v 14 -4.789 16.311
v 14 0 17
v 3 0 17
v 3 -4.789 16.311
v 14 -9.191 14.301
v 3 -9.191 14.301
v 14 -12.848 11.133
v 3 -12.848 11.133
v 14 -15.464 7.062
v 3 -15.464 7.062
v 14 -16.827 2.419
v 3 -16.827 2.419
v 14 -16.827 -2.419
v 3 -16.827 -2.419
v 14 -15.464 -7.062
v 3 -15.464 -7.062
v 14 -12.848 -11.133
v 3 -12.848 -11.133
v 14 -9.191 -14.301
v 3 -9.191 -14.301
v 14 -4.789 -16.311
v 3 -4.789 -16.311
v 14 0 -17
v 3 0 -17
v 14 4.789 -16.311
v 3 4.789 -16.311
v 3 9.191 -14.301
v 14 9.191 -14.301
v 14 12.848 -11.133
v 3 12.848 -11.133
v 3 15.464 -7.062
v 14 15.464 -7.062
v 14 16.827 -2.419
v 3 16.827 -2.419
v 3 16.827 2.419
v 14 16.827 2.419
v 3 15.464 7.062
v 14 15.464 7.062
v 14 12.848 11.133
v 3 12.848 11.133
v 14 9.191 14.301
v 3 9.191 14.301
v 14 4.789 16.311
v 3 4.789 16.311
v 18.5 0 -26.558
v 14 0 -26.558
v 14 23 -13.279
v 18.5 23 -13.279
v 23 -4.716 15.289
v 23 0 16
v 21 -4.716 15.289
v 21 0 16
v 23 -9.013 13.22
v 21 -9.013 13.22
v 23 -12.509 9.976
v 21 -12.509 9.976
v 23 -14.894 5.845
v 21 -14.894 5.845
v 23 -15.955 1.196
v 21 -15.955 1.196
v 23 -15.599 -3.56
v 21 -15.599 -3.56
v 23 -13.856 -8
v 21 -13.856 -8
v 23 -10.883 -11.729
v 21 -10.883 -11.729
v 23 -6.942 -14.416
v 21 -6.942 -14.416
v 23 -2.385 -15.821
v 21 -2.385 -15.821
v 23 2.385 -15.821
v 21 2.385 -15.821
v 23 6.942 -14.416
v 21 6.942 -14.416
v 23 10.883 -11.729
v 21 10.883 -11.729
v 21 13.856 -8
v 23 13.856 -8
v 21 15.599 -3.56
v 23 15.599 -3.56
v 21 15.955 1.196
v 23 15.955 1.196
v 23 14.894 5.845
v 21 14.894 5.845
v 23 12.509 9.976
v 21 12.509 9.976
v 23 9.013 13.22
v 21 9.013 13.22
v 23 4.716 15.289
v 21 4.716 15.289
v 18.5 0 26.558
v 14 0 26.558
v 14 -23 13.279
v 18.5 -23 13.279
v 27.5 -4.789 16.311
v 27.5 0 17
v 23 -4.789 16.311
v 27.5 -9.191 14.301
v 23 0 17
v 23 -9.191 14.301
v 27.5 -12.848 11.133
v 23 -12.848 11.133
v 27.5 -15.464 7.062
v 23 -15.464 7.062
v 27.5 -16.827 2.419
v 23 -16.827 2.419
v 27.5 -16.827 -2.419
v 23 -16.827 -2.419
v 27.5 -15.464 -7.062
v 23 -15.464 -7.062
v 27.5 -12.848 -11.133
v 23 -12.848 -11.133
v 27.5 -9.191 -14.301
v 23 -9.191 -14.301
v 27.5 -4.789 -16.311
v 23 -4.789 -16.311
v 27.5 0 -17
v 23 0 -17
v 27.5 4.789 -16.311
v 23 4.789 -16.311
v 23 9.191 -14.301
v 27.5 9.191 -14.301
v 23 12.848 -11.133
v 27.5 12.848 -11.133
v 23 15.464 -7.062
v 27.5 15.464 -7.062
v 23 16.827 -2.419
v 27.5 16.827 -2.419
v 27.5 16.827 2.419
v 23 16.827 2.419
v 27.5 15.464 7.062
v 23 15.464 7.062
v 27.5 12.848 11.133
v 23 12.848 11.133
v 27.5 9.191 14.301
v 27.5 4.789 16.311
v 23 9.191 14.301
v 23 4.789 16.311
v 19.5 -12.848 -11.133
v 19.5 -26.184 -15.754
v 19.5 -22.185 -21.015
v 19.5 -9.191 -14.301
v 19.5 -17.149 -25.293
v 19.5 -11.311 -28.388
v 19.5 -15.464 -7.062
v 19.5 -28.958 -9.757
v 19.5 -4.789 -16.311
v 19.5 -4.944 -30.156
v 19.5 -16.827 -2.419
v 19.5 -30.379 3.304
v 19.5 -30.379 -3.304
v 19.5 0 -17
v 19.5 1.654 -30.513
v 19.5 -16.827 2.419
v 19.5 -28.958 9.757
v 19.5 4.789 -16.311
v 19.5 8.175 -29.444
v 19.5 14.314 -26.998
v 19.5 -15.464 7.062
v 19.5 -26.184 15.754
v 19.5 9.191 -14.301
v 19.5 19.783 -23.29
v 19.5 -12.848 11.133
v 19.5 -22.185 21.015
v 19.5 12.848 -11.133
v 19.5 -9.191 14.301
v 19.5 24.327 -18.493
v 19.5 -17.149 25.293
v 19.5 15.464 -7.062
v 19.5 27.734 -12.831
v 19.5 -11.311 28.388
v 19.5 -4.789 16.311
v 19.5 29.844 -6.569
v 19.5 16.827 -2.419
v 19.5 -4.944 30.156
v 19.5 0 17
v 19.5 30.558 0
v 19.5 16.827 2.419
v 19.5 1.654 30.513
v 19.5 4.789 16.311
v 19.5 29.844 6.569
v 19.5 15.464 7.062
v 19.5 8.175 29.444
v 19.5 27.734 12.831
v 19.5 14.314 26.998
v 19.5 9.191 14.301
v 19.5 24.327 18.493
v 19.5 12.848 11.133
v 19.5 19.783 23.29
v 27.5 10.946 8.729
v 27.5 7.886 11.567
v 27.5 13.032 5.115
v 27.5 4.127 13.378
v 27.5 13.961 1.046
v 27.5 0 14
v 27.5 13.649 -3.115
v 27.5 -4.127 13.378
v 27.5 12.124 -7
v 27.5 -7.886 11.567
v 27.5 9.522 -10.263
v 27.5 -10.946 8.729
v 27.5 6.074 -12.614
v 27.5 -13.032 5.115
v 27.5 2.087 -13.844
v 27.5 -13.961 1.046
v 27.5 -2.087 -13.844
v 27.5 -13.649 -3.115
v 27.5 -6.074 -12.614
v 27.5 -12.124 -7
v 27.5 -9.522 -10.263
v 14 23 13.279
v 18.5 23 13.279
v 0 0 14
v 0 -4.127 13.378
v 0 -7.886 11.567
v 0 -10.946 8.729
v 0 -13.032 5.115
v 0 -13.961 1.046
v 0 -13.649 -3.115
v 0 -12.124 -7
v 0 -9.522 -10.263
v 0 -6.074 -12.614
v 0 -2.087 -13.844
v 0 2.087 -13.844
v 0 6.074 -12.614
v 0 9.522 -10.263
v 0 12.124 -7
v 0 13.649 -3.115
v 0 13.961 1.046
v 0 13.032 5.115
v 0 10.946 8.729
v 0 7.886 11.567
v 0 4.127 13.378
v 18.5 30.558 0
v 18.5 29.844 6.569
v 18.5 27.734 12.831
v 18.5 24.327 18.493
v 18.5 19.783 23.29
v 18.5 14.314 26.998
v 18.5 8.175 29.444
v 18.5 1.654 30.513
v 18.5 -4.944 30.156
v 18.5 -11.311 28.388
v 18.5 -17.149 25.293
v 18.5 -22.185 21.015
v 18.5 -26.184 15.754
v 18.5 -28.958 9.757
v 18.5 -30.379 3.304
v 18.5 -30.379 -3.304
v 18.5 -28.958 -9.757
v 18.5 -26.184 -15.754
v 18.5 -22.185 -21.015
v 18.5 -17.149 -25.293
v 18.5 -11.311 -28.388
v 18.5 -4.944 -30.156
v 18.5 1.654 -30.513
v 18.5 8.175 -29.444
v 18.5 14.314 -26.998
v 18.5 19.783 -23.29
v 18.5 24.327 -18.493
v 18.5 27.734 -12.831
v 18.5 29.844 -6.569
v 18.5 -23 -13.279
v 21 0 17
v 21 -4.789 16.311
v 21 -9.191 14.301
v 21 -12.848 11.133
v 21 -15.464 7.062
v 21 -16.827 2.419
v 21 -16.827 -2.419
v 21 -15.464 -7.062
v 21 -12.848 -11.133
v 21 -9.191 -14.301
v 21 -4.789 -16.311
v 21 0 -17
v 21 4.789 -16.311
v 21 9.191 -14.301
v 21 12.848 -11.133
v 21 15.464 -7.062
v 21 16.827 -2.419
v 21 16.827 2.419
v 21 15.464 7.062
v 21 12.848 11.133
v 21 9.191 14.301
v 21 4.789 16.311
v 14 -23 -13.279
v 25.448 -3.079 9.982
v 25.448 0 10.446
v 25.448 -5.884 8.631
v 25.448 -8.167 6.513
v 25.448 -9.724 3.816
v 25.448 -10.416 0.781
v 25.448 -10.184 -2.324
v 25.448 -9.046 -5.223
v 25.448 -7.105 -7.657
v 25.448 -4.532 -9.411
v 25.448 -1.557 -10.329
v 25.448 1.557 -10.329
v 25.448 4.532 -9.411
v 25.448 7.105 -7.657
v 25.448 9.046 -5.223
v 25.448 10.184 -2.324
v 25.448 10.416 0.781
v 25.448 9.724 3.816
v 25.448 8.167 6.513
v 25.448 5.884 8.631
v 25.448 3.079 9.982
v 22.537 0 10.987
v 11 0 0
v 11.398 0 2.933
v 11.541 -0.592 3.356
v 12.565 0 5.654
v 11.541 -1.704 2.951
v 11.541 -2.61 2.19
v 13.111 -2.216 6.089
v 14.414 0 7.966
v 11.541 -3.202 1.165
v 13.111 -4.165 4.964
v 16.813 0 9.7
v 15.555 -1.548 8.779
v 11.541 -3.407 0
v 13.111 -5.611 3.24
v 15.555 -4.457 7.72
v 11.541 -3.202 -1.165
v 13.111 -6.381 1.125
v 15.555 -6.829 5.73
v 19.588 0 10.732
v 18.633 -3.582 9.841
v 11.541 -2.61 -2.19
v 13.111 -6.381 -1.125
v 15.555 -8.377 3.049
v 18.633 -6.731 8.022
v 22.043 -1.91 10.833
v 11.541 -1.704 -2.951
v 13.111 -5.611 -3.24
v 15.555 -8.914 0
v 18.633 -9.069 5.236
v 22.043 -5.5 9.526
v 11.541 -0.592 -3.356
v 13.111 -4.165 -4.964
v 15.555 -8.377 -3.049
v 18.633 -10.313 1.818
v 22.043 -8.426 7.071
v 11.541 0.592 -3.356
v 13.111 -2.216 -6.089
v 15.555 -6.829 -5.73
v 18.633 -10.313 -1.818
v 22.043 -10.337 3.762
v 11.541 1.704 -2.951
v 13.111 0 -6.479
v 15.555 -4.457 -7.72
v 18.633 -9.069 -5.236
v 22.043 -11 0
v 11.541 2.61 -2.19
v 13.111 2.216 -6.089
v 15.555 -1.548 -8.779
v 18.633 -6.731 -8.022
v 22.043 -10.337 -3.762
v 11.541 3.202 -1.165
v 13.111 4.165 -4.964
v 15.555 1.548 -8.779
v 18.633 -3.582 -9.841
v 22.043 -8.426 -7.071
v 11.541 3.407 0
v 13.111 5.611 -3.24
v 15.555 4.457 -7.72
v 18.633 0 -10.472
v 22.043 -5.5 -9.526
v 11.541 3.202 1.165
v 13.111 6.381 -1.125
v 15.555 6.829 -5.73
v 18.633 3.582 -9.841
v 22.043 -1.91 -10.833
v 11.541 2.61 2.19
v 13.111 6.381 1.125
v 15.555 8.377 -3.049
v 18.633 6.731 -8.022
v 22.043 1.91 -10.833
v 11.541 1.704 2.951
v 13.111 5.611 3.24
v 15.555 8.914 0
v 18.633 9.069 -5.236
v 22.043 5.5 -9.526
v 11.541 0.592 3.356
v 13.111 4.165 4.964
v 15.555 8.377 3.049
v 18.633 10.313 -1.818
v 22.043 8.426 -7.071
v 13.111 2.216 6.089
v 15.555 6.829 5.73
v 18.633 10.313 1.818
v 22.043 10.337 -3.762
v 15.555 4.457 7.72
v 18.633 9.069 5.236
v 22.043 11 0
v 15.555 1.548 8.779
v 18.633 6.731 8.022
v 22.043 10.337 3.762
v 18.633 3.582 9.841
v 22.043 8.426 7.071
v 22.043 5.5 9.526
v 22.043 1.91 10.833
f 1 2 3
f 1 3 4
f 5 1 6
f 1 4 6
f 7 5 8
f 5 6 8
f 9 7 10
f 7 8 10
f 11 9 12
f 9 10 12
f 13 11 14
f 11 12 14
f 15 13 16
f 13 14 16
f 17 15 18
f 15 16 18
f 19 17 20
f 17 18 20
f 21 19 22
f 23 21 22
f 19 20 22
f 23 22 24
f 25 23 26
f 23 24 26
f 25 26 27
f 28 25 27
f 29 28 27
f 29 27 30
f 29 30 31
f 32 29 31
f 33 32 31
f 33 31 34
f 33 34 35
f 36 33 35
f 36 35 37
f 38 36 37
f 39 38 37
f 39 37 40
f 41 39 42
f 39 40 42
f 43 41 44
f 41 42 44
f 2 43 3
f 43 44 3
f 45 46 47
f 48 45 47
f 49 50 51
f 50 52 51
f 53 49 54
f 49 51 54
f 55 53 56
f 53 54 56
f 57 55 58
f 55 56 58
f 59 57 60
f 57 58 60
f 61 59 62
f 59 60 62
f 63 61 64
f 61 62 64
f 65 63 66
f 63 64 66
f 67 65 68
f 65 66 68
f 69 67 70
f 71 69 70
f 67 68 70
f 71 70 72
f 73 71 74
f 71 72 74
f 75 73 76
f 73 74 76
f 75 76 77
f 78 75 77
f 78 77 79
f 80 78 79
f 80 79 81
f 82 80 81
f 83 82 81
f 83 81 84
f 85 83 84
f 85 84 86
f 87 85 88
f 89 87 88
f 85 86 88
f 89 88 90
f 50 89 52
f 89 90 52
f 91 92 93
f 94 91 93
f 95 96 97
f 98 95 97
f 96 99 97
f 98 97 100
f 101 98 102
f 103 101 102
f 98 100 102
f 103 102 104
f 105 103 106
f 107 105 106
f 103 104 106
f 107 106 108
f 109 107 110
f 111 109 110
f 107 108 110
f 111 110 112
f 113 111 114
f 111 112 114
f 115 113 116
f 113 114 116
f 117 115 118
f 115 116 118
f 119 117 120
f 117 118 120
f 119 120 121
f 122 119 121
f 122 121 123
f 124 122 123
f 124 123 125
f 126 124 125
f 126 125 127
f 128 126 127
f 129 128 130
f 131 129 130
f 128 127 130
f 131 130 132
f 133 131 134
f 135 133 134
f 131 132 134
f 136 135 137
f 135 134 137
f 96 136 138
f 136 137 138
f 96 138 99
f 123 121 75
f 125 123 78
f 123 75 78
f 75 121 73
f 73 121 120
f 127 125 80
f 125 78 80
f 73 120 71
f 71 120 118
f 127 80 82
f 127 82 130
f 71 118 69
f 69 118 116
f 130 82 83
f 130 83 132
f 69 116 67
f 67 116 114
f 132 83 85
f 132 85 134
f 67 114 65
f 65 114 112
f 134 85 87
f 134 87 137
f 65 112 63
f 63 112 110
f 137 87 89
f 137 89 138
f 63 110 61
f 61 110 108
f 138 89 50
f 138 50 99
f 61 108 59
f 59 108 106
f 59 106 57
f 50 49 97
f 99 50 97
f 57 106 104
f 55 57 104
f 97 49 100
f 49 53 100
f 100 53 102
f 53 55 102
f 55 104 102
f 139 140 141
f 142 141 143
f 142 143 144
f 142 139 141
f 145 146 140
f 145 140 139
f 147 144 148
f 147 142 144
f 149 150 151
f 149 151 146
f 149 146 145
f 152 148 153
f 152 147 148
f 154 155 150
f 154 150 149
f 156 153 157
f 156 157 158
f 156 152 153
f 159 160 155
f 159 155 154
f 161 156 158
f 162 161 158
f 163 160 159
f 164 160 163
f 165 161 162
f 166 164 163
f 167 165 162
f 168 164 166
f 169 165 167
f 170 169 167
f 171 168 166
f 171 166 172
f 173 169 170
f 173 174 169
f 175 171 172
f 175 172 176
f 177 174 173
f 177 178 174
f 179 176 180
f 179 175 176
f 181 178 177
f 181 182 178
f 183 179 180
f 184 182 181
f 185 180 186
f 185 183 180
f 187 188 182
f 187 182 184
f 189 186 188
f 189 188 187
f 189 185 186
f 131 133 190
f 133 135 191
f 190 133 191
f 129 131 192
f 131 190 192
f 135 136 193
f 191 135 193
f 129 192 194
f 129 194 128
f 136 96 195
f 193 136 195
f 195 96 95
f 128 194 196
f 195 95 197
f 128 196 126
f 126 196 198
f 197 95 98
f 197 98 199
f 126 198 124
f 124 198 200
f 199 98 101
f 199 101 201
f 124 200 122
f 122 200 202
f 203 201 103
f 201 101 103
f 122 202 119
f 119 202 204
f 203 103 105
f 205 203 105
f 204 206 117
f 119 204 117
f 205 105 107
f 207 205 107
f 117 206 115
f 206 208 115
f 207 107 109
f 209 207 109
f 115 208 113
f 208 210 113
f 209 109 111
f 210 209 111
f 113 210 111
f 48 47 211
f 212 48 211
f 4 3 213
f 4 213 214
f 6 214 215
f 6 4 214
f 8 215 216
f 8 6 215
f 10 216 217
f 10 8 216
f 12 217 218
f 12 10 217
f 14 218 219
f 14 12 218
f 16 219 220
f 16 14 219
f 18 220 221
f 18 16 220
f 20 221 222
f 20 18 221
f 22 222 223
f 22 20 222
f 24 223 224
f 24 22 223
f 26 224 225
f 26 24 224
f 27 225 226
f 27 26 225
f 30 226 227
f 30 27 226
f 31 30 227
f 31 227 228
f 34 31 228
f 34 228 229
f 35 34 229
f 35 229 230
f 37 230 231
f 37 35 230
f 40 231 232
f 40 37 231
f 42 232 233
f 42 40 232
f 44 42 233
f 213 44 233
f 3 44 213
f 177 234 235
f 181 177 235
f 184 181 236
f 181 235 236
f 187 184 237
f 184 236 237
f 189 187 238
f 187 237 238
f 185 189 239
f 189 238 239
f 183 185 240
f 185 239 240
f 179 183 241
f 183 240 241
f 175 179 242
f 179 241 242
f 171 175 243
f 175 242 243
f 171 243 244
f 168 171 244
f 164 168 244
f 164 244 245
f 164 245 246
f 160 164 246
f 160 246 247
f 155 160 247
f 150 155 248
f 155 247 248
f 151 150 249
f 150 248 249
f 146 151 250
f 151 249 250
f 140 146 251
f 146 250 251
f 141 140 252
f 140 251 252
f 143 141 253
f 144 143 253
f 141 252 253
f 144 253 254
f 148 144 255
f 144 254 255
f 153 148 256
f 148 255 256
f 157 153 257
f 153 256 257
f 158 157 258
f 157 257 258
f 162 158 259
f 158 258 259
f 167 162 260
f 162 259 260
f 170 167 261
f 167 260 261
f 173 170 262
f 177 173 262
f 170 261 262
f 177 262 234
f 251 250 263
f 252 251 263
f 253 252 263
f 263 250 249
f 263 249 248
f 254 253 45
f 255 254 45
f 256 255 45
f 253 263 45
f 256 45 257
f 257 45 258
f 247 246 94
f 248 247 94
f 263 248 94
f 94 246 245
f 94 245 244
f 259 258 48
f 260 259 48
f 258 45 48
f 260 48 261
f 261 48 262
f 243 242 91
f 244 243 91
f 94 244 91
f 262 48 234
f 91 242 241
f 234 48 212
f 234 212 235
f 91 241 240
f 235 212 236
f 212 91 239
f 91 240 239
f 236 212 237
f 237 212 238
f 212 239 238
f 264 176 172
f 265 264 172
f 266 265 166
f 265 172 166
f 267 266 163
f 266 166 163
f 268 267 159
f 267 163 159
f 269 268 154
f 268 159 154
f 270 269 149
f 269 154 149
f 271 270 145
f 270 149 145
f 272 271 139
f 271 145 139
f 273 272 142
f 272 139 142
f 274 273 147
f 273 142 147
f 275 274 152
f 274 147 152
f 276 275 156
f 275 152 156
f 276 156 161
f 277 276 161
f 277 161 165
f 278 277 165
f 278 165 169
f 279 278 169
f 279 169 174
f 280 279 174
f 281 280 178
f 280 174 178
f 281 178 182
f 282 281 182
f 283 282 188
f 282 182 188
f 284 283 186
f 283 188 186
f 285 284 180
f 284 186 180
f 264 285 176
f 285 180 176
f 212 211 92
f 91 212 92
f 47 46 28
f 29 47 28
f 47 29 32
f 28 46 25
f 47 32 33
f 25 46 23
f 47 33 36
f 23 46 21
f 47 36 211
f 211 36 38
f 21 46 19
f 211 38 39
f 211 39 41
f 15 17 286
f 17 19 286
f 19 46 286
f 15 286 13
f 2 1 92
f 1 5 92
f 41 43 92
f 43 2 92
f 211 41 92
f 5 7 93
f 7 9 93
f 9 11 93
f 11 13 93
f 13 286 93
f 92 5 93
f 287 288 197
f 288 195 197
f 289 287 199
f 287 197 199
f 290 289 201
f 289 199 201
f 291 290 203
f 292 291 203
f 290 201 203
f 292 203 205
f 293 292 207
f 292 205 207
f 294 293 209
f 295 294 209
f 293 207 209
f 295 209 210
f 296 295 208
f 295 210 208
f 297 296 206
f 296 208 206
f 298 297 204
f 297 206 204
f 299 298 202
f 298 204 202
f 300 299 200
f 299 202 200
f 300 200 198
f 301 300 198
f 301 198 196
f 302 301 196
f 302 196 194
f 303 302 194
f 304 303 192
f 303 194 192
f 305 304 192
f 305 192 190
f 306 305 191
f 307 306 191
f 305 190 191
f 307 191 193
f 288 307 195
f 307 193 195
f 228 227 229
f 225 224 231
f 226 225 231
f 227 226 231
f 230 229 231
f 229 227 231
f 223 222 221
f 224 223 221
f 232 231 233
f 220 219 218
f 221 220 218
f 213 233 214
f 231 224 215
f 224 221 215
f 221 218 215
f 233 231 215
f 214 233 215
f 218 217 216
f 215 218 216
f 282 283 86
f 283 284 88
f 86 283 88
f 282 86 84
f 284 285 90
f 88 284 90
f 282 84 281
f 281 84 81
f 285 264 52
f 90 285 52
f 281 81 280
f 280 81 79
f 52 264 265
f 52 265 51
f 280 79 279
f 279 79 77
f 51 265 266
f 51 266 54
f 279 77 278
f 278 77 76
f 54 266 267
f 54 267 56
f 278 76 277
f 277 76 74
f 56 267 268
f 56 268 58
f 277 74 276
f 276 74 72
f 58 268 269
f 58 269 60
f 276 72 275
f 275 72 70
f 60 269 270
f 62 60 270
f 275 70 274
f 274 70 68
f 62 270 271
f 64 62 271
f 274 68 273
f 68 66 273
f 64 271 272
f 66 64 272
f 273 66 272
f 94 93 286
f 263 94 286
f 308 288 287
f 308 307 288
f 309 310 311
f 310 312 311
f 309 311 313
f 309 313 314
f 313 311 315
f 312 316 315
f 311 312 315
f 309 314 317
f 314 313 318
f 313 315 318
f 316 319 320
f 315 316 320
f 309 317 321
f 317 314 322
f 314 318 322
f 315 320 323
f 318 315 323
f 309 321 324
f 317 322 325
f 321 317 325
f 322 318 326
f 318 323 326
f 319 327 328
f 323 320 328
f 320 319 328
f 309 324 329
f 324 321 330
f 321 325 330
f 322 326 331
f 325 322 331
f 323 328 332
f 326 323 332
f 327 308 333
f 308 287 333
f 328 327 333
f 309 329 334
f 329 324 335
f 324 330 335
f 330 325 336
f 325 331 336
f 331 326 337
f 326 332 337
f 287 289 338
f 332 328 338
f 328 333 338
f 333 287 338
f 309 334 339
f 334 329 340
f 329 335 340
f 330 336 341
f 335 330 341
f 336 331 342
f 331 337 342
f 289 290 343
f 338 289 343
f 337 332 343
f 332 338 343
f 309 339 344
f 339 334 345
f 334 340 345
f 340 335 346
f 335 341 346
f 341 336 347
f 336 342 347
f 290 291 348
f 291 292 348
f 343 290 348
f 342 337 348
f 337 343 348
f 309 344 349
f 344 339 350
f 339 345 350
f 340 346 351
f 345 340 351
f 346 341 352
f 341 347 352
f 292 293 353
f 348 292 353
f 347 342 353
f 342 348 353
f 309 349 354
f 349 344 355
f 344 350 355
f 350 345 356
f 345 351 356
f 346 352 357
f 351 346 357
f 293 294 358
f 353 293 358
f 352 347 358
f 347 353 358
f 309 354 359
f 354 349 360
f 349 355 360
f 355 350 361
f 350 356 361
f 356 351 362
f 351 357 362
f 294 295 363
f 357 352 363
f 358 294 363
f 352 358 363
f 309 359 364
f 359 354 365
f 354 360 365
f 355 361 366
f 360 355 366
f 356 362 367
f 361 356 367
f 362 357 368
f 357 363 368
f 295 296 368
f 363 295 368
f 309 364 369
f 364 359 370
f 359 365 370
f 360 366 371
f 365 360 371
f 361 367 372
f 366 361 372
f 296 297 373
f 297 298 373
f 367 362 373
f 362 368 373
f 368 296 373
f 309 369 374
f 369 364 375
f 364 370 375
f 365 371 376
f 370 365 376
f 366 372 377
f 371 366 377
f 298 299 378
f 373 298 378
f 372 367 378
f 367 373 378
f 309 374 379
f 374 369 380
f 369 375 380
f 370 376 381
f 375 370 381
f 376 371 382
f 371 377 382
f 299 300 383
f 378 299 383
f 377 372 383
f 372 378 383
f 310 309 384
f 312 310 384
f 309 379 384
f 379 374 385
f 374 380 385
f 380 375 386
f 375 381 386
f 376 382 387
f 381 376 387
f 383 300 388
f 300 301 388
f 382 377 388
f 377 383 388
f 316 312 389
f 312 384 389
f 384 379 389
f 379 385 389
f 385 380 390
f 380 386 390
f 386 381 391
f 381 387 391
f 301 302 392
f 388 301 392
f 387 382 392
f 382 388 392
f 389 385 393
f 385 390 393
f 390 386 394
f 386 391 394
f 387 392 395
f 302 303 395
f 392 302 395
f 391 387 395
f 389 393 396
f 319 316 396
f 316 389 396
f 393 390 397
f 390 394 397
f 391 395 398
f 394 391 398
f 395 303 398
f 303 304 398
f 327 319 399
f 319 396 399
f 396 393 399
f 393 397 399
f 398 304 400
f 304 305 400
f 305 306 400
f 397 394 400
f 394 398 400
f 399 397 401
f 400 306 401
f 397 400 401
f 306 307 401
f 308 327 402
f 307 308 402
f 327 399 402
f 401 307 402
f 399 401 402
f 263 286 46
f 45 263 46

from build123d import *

# Parameters (mm, degrees)
F3_DEPTH = 25
F4_SIZE  = 3
F5_R     = 30.5581123827
F5_R_2   = 17
F6_DEPTH = 1


with BuildPart() as f1:
    # F0 (on Front) → F1 (revolve)
    with BuildSketch(Plane.XZ):
        with BuildLine():
            Line((0, 17), (0, 0))
            Line((0, 0), (11, 0))
            ThreePointArc((11, 0), (15.5551164444, 8.914228848), (25.4479047191, 10.4456667115))
            Line((25.4479047191, 10.4456667115), (27.5, 14))
            Line((27.5, 14), (27.5, 17))
            Line((27.5, 17), (23, 17))
            Line((23, 17), (23, 16))
            Line((23, 16), (21, 16))
            Line((21, 16), (21, 17))
            Line((21, 17), (18.5, 17))
            Line((18.5, 17), (18.5, 40))
            Line((18.5, 40), (14, 40))
            Line((14, 40), (14, 17))
            Line((14, 17), (0, 17))
        make_face()
    revolve(axis=Axis((11, 0, 0), (1, 0, 0)))

    # F2 (on face) → F3 (cut)
    with BuildSketch(Plane(origin=(14, 0, 0), x_dir=(0, -1, 0), z_dir=(-1, 0, 0))):
        with BuildLine():
            ThreePointArc((16.8416654415, -36.281652459), (20, -34.6410161514), (23, -32.7261363439))
            Line((23, -32.7261363439), (23, -13.2790561914))
            Line((23, -13.2790561914), (0, -26.5581123827))
            Line((0, -26.5581123827), (16.8416654415, -36.281652459))
        make_face()
        with BuildLine():
            Line((23, -13.2790561914), (23, -32.7261363439))
            ThreePointArc((23, -32.7261363439), (34.6410161514, -20), (39.8416654415, -3.5555161151))
            Line((39.8416654415, -3.5555161151), (23, -13.2790561914))
        make_face()
        with BuildLine():
            Line((23, 13.2790561914), (23, -13.2790561914))
            Line((23, -13.2790561914), (39.8416654415, -3.5555161151))
            ThreePointArc((39.8416654415, -3.5555161151), (39.9603967552, -1.7795199266), (40, 0))
            ThreePointArc((40, 0), (39.9603967552, 1.7795199266), (39.8416654415, 3.5555161151))
            Line((39.8416654415, 3.5555161151), (23, 13.2790561914))
        make_face()
        with BuildLine():
            Line((23, 32.7261363439), (23, 13.2790561914))
            Line((23, 13.2790561914), (39.8416654415, 3.5555161151))
            ThreePointArc((39.8416654415, 3.5555161151), (34.6410161514, 20), (23, 32.7261363439))
        make_face()
        with BuildLine():
            Line((0, 26.5581123827), (23, 13.2790561914))
            Line((23, 13.2790561914), (23, 32.7261363439))
            ThreePointArc((23, 32.7261363439), (20, 34.6410161514), (16.8416654415, 36.281652459))
            Line((16.8416654415, 36.281652459), (0, 26.5581123827))
        make_face()
        with BuildLine():
            Line((-16.8416654415, 36.281652459), (0, 26.5581123827))
            Line((0, 26.5581123827), (16.8416654415, 36.281652459))
            ThreePointArc((16.8416654415, 36.281652459), (0, 40), (-16.8416654415, 36.281652459))
        make_face()
        with BuildLine():
            Line((-23, 13.2790561914), (0, 26.5581123827))
            Line((0, 26.5581123827), (-16.8416654415, 36.281652459))
            ThreePointArc((-16.8416654415, 36.281652459), (-20, 34.6410161514), (-23, 32.7261363439))
            Line((-23, 32.7261363439), (-23, 13.2790561914))
        make_face()
        with BuildLine():
            Line((-39.8416654415, -3.5555161151), (-23, -13.2790561914))
            Line((-23, -13.2790561914), (-23, 13.2790561914))
            Line((-23, 13.2790561914), (-39.8416654415, 3.5555161151))
            ThreePointArc((-39.8416654415, 3.5555161151), (-40, 0), (-39.8416654415, -3.5555161151))
        make_face()
        with BuildLine():
            Line((-23, -32.7261363439), (-23, -13.2790561914))
            Line((-23, -13.2790561914), (-39.8416654415, -3.5555161151))
            ThreePointArc((-39.8416654415, -3.5555161151), (-34.6410161514, -20), (-23, -32.7261363439))
        make_face()
        with BuildLine():
            Line((-16.8416654415, -36.281652459), (0, -26.5581123827))
            Line((0, -26.5581123827), (-23, -13.2790561914))
            Line((-23, -13.2790561914), (-23, -32.7261363439))
            ThreePointArc((-23, -32.7261363439), (-20, -34.6410161514), (-16.8416654415, -36.281652459))
        make_face()
        with BuildLine():
            ThreePointArc((-16.8416654415, -36.281652459), (0, -40), (16.8416654415, -36.281652459))
            Line((16.8416654415, -36.281652459), (0, -26.5581123827))
            Line((0, -26.5581123827), (-16.8416654415, -36.281652459))
        make_face()
        with BuildLine():
            Line((-39.8416654415, 3.5555161151), (-23, 13.2790561914))
            Line((-23, 13.2790561914), (-23, 32.7261363439))
            ThreePointArc((-23, 32.7261363439), (-34.6410161514, 20), (-39.8416654415, 3.5555161151))
        make_face()
    extrude(amount=-F3_DEPTH, mode=Mode.SUBTRACT)

    # F4
    f4_edges = [f1.edges().sort_by_distance(p)[0] for p in [
        (0, 0, -17),
    ]]
    chamfer(f4_edges, length=F4_SIZE)

    # F5 (on face) → F6 (join)
    with BuildSketch(Plane.YZ.offset(18.5)):
        Circle(F5_R)
        Polygon((23, 13.2790561914), (23, -13.2790561914), (0, -26.5581123827), (-23, -13.2790561914), (-23, 13.2790561914), (0, 26.5581123827), align=None, mode=Mode.SUBTRACT)
        Polygon((0, -26.5581123827), (23, -13.2790561914), (23, 13.2790561914), (0, 26.5581123827), (-23, 13.2790561914), (-23, -13.2790561914), align=None)
        Circle(F5_R_2, mode=Mode.SUBTRACT)
    extrude(amount=F6_DEPTH)


solid = f1.part
